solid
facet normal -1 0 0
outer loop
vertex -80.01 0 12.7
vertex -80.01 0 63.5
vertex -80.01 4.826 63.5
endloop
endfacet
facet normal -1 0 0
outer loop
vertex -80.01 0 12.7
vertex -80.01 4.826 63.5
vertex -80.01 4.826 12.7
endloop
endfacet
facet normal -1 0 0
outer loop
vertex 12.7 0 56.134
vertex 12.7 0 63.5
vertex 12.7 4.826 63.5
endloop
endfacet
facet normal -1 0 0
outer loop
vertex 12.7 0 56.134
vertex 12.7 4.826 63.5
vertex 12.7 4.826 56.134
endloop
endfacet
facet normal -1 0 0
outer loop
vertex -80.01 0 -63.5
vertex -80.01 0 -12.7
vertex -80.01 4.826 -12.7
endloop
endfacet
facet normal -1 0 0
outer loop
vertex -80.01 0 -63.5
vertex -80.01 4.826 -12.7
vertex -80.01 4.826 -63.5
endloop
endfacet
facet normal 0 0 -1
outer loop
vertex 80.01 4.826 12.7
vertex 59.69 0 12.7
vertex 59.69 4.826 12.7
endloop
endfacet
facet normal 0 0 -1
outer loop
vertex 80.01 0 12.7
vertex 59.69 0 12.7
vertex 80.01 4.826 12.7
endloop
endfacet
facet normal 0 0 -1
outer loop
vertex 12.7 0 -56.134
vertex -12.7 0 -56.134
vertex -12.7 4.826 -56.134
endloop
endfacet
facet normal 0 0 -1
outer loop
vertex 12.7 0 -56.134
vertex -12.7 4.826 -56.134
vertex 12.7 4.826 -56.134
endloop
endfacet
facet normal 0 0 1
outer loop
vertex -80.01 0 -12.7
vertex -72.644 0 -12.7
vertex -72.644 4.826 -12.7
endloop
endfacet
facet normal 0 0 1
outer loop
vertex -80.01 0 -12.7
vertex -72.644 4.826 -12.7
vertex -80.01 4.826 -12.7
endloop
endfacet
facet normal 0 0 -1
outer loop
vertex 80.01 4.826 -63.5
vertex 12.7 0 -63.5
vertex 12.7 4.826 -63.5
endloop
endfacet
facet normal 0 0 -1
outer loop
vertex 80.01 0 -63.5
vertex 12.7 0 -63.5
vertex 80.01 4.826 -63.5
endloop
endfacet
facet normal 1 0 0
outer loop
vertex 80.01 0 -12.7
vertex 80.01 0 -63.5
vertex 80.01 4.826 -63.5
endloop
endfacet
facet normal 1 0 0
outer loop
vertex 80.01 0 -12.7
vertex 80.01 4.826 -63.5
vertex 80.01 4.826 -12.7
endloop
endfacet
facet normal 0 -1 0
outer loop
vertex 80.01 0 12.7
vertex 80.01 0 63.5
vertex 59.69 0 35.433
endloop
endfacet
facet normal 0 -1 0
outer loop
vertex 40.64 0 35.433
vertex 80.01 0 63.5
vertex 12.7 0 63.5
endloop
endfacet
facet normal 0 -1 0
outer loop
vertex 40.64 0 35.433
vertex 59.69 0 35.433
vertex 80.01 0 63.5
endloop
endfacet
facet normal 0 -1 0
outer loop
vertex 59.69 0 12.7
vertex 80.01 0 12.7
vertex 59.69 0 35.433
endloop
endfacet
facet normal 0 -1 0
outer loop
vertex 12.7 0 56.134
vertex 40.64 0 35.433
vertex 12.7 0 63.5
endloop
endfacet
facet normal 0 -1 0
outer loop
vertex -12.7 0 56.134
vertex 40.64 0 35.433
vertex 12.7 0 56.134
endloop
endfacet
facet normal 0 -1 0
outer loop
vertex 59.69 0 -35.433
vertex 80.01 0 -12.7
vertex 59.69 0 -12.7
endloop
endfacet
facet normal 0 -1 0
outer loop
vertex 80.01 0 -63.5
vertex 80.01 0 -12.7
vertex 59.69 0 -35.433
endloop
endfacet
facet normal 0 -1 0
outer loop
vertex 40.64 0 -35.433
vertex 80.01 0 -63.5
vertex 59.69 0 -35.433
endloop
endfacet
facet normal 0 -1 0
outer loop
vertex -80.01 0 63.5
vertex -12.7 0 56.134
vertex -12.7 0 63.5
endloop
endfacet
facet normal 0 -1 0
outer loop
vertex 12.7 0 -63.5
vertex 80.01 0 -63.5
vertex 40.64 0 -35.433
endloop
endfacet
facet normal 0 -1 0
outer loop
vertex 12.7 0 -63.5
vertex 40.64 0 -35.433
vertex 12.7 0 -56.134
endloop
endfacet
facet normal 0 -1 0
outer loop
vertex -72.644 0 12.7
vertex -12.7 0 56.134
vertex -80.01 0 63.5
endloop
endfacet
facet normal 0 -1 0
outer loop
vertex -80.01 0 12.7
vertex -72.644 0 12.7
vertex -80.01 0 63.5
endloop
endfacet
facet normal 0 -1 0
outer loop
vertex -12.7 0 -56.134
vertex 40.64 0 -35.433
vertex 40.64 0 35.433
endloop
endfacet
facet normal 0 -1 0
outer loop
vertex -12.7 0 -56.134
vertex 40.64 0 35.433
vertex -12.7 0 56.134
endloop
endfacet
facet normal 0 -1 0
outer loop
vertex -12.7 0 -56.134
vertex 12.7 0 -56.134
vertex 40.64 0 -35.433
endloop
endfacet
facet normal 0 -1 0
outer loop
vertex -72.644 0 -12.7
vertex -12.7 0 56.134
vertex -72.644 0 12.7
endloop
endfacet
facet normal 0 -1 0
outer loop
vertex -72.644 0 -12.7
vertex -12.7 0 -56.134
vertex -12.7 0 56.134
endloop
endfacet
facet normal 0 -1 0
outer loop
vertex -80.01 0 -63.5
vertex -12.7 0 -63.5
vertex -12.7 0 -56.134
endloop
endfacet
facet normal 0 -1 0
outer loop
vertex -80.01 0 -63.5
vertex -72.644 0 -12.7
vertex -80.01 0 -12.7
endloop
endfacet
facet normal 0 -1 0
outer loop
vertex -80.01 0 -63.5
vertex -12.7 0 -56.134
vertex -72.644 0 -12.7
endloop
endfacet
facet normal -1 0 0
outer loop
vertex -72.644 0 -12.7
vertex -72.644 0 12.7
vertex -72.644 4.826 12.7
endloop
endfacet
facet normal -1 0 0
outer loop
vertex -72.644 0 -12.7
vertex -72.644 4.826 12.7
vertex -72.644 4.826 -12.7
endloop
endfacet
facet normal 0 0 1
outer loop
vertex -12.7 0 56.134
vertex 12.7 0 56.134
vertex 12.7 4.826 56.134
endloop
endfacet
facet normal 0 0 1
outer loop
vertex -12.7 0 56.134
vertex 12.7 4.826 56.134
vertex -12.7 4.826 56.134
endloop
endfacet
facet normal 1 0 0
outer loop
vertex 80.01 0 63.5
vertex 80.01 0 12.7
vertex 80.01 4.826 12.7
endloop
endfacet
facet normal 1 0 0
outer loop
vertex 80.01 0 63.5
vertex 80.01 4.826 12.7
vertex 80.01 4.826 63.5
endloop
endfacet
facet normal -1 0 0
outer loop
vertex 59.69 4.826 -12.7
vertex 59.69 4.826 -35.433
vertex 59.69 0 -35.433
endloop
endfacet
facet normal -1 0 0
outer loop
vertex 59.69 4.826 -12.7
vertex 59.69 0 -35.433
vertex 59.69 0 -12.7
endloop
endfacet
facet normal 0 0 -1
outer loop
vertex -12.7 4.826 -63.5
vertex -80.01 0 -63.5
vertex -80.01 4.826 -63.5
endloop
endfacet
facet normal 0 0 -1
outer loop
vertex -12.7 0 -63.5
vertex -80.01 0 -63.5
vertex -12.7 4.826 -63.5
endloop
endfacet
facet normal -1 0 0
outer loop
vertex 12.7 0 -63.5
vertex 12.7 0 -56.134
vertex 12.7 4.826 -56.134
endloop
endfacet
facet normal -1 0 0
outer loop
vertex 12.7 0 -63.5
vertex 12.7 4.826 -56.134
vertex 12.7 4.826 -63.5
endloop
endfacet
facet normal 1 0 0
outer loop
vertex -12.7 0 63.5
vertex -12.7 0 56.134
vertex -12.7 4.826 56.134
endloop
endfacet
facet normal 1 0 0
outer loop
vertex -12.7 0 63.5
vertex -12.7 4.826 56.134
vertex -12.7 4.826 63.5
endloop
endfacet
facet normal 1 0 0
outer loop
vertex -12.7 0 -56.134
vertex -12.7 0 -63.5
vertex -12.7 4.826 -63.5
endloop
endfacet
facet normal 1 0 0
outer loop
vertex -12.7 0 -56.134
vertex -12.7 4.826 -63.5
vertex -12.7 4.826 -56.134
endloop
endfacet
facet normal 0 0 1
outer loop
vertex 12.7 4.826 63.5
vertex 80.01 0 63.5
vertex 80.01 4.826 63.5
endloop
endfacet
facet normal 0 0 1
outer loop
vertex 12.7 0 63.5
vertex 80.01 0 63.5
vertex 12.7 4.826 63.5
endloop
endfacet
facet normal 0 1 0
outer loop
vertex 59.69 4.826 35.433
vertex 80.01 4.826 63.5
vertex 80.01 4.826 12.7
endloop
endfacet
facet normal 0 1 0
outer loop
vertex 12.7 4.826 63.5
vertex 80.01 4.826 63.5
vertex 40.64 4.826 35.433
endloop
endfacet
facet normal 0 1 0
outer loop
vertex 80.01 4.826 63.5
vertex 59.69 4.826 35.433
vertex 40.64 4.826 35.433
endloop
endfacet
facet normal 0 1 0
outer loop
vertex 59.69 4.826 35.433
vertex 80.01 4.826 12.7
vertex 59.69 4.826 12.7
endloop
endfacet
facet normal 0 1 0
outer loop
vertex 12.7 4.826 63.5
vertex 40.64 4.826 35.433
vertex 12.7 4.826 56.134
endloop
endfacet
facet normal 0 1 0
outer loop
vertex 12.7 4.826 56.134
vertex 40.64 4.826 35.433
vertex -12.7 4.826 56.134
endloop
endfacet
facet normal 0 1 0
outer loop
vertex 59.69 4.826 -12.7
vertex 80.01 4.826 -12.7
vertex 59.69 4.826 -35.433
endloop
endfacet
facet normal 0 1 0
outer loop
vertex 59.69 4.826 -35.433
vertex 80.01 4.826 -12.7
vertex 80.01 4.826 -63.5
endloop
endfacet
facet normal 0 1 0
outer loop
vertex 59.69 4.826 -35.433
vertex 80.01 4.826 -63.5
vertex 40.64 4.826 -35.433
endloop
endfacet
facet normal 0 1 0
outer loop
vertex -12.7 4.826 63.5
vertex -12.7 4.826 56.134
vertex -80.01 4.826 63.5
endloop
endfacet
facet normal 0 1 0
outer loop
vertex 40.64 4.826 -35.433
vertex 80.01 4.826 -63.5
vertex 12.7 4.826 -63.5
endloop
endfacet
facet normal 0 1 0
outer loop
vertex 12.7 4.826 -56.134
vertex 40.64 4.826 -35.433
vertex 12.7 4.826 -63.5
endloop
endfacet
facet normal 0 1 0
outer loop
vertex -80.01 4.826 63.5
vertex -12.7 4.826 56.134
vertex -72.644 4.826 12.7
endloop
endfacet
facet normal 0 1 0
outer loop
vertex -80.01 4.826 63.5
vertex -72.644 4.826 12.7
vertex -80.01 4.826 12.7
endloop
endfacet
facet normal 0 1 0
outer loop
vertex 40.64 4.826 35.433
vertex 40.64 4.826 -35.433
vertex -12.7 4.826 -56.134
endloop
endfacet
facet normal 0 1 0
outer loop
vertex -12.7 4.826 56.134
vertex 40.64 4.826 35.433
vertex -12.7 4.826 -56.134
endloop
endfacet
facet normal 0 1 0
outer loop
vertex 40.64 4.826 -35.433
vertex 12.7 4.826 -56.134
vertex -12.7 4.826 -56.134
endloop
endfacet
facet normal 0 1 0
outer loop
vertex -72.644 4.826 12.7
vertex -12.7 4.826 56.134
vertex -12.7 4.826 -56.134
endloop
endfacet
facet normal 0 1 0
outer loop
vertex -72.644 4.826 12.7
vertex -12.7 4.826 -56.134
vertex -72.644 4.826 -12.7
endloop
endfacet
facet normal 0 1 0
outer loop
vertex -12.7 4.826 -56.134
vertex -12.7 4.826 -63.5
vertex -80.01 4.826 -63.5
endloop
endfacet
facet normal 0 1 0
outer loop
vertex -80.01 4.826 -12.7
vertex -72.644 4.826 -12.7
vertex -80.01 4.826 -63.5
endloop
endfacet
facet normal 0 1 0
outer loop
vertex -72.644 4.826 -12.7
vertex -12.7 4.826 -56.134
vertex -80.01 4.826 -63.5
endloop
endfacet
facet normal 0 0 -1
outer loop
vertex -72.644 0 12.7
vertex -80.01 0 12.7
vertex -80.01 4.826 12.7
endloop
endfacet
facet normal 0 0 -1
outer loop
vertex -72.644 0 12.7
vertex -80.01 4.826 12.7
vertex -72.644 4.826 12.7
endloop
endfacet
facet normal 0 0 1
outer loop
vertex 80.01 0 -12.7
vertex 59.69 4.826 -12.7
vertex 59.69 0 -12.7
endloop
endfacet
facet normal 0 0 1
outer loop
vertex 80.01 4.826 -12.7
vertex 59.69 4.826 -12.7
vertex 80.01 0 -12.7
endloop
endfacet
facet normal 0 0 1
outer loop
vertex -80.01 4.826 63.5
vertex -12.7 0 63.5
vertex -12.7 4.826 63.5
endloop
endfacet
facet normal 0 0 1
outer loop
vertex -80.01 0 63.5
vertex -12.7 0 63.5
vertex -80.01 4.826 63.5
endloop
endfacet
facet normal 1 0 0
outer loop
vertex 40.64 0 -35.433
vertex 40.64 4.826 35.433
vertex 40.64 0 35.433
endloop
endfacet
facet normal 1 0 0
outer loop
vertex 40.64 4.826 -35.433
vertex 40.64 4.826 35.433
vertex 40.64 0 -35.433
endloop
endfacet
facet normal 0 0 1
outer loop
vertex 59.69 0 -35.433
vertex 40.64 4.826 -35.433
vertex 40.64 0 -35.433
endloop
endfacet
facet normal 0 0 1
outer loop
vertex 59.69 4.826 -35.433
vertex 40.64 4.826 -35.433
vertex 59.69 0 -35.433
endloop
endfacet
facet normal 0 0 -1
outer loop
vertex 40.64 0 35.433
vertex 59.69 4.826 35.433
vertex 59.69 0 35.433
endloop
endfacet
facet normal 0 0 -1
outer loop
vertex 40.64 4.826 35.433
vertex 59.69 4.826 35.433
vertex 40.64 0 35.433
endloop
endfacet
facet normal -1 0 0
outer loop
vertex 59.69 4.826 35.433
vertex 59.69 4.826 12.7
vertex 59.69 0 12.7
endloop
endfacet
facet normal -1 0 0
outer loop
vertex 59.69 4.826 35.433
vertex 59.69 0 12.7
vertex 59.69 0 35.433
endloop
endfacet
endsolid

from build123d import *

# Parameters (mm, degrees)
BOSS_EXTRUDE1_DEPTH = 4.826
CUT_EXTRUDE1_DEPTH  = 4.826


with BuildPart() as part:
    # Sketch1 → Boss-Extrude1 (new body)
    with BuildSketch(Plane(origin=(0, 0, 0), x_dir=(1, 0, 0), z_dir=(0, 1, 0))):
        Polygon((-80.01, 63.5), (-12.7, 63.5), (-12.7, 56.134), (12.7, 56.134), (12.7, 63.5), (80.01, 63.5), (80.01, 12.7), (72.644, 12.7), (72.644, -12.7), (80.01, -12.7), (80.01, -63.5), (12.7, -63.5), (12.7, -56.134), (-12.7, -56.134), (-12.7, -63.5), (-80.01, -63.5), (-80.01, -12.7), (-72.644, -12.7), (-72.644, 12.7), (-80.01, 12.7), align=None)
    extrude(amount=BOSS_EXTRUDE1_DEPTH)

    # Sketch3 → Cut-Extrude1 (cut)
    with BuildSketch(Plane(origin=(0, 4.826, 0), x_dir=(1, 0, 0), z_dir=(0, 1, 0))):
        Polygon((59.69, -35.433), (40.64, -35.433), (40.64, 35.433), (59.69, 35.433), (59.69, 12.7), (72.644, 12.7), (72.644, -12.7), (59.69, -12.7), align=None)
    extrude(amount=-CUT_EXTRUDE1_DEPTH, mode=Mode.SUBTRACT)


solid = part.part
